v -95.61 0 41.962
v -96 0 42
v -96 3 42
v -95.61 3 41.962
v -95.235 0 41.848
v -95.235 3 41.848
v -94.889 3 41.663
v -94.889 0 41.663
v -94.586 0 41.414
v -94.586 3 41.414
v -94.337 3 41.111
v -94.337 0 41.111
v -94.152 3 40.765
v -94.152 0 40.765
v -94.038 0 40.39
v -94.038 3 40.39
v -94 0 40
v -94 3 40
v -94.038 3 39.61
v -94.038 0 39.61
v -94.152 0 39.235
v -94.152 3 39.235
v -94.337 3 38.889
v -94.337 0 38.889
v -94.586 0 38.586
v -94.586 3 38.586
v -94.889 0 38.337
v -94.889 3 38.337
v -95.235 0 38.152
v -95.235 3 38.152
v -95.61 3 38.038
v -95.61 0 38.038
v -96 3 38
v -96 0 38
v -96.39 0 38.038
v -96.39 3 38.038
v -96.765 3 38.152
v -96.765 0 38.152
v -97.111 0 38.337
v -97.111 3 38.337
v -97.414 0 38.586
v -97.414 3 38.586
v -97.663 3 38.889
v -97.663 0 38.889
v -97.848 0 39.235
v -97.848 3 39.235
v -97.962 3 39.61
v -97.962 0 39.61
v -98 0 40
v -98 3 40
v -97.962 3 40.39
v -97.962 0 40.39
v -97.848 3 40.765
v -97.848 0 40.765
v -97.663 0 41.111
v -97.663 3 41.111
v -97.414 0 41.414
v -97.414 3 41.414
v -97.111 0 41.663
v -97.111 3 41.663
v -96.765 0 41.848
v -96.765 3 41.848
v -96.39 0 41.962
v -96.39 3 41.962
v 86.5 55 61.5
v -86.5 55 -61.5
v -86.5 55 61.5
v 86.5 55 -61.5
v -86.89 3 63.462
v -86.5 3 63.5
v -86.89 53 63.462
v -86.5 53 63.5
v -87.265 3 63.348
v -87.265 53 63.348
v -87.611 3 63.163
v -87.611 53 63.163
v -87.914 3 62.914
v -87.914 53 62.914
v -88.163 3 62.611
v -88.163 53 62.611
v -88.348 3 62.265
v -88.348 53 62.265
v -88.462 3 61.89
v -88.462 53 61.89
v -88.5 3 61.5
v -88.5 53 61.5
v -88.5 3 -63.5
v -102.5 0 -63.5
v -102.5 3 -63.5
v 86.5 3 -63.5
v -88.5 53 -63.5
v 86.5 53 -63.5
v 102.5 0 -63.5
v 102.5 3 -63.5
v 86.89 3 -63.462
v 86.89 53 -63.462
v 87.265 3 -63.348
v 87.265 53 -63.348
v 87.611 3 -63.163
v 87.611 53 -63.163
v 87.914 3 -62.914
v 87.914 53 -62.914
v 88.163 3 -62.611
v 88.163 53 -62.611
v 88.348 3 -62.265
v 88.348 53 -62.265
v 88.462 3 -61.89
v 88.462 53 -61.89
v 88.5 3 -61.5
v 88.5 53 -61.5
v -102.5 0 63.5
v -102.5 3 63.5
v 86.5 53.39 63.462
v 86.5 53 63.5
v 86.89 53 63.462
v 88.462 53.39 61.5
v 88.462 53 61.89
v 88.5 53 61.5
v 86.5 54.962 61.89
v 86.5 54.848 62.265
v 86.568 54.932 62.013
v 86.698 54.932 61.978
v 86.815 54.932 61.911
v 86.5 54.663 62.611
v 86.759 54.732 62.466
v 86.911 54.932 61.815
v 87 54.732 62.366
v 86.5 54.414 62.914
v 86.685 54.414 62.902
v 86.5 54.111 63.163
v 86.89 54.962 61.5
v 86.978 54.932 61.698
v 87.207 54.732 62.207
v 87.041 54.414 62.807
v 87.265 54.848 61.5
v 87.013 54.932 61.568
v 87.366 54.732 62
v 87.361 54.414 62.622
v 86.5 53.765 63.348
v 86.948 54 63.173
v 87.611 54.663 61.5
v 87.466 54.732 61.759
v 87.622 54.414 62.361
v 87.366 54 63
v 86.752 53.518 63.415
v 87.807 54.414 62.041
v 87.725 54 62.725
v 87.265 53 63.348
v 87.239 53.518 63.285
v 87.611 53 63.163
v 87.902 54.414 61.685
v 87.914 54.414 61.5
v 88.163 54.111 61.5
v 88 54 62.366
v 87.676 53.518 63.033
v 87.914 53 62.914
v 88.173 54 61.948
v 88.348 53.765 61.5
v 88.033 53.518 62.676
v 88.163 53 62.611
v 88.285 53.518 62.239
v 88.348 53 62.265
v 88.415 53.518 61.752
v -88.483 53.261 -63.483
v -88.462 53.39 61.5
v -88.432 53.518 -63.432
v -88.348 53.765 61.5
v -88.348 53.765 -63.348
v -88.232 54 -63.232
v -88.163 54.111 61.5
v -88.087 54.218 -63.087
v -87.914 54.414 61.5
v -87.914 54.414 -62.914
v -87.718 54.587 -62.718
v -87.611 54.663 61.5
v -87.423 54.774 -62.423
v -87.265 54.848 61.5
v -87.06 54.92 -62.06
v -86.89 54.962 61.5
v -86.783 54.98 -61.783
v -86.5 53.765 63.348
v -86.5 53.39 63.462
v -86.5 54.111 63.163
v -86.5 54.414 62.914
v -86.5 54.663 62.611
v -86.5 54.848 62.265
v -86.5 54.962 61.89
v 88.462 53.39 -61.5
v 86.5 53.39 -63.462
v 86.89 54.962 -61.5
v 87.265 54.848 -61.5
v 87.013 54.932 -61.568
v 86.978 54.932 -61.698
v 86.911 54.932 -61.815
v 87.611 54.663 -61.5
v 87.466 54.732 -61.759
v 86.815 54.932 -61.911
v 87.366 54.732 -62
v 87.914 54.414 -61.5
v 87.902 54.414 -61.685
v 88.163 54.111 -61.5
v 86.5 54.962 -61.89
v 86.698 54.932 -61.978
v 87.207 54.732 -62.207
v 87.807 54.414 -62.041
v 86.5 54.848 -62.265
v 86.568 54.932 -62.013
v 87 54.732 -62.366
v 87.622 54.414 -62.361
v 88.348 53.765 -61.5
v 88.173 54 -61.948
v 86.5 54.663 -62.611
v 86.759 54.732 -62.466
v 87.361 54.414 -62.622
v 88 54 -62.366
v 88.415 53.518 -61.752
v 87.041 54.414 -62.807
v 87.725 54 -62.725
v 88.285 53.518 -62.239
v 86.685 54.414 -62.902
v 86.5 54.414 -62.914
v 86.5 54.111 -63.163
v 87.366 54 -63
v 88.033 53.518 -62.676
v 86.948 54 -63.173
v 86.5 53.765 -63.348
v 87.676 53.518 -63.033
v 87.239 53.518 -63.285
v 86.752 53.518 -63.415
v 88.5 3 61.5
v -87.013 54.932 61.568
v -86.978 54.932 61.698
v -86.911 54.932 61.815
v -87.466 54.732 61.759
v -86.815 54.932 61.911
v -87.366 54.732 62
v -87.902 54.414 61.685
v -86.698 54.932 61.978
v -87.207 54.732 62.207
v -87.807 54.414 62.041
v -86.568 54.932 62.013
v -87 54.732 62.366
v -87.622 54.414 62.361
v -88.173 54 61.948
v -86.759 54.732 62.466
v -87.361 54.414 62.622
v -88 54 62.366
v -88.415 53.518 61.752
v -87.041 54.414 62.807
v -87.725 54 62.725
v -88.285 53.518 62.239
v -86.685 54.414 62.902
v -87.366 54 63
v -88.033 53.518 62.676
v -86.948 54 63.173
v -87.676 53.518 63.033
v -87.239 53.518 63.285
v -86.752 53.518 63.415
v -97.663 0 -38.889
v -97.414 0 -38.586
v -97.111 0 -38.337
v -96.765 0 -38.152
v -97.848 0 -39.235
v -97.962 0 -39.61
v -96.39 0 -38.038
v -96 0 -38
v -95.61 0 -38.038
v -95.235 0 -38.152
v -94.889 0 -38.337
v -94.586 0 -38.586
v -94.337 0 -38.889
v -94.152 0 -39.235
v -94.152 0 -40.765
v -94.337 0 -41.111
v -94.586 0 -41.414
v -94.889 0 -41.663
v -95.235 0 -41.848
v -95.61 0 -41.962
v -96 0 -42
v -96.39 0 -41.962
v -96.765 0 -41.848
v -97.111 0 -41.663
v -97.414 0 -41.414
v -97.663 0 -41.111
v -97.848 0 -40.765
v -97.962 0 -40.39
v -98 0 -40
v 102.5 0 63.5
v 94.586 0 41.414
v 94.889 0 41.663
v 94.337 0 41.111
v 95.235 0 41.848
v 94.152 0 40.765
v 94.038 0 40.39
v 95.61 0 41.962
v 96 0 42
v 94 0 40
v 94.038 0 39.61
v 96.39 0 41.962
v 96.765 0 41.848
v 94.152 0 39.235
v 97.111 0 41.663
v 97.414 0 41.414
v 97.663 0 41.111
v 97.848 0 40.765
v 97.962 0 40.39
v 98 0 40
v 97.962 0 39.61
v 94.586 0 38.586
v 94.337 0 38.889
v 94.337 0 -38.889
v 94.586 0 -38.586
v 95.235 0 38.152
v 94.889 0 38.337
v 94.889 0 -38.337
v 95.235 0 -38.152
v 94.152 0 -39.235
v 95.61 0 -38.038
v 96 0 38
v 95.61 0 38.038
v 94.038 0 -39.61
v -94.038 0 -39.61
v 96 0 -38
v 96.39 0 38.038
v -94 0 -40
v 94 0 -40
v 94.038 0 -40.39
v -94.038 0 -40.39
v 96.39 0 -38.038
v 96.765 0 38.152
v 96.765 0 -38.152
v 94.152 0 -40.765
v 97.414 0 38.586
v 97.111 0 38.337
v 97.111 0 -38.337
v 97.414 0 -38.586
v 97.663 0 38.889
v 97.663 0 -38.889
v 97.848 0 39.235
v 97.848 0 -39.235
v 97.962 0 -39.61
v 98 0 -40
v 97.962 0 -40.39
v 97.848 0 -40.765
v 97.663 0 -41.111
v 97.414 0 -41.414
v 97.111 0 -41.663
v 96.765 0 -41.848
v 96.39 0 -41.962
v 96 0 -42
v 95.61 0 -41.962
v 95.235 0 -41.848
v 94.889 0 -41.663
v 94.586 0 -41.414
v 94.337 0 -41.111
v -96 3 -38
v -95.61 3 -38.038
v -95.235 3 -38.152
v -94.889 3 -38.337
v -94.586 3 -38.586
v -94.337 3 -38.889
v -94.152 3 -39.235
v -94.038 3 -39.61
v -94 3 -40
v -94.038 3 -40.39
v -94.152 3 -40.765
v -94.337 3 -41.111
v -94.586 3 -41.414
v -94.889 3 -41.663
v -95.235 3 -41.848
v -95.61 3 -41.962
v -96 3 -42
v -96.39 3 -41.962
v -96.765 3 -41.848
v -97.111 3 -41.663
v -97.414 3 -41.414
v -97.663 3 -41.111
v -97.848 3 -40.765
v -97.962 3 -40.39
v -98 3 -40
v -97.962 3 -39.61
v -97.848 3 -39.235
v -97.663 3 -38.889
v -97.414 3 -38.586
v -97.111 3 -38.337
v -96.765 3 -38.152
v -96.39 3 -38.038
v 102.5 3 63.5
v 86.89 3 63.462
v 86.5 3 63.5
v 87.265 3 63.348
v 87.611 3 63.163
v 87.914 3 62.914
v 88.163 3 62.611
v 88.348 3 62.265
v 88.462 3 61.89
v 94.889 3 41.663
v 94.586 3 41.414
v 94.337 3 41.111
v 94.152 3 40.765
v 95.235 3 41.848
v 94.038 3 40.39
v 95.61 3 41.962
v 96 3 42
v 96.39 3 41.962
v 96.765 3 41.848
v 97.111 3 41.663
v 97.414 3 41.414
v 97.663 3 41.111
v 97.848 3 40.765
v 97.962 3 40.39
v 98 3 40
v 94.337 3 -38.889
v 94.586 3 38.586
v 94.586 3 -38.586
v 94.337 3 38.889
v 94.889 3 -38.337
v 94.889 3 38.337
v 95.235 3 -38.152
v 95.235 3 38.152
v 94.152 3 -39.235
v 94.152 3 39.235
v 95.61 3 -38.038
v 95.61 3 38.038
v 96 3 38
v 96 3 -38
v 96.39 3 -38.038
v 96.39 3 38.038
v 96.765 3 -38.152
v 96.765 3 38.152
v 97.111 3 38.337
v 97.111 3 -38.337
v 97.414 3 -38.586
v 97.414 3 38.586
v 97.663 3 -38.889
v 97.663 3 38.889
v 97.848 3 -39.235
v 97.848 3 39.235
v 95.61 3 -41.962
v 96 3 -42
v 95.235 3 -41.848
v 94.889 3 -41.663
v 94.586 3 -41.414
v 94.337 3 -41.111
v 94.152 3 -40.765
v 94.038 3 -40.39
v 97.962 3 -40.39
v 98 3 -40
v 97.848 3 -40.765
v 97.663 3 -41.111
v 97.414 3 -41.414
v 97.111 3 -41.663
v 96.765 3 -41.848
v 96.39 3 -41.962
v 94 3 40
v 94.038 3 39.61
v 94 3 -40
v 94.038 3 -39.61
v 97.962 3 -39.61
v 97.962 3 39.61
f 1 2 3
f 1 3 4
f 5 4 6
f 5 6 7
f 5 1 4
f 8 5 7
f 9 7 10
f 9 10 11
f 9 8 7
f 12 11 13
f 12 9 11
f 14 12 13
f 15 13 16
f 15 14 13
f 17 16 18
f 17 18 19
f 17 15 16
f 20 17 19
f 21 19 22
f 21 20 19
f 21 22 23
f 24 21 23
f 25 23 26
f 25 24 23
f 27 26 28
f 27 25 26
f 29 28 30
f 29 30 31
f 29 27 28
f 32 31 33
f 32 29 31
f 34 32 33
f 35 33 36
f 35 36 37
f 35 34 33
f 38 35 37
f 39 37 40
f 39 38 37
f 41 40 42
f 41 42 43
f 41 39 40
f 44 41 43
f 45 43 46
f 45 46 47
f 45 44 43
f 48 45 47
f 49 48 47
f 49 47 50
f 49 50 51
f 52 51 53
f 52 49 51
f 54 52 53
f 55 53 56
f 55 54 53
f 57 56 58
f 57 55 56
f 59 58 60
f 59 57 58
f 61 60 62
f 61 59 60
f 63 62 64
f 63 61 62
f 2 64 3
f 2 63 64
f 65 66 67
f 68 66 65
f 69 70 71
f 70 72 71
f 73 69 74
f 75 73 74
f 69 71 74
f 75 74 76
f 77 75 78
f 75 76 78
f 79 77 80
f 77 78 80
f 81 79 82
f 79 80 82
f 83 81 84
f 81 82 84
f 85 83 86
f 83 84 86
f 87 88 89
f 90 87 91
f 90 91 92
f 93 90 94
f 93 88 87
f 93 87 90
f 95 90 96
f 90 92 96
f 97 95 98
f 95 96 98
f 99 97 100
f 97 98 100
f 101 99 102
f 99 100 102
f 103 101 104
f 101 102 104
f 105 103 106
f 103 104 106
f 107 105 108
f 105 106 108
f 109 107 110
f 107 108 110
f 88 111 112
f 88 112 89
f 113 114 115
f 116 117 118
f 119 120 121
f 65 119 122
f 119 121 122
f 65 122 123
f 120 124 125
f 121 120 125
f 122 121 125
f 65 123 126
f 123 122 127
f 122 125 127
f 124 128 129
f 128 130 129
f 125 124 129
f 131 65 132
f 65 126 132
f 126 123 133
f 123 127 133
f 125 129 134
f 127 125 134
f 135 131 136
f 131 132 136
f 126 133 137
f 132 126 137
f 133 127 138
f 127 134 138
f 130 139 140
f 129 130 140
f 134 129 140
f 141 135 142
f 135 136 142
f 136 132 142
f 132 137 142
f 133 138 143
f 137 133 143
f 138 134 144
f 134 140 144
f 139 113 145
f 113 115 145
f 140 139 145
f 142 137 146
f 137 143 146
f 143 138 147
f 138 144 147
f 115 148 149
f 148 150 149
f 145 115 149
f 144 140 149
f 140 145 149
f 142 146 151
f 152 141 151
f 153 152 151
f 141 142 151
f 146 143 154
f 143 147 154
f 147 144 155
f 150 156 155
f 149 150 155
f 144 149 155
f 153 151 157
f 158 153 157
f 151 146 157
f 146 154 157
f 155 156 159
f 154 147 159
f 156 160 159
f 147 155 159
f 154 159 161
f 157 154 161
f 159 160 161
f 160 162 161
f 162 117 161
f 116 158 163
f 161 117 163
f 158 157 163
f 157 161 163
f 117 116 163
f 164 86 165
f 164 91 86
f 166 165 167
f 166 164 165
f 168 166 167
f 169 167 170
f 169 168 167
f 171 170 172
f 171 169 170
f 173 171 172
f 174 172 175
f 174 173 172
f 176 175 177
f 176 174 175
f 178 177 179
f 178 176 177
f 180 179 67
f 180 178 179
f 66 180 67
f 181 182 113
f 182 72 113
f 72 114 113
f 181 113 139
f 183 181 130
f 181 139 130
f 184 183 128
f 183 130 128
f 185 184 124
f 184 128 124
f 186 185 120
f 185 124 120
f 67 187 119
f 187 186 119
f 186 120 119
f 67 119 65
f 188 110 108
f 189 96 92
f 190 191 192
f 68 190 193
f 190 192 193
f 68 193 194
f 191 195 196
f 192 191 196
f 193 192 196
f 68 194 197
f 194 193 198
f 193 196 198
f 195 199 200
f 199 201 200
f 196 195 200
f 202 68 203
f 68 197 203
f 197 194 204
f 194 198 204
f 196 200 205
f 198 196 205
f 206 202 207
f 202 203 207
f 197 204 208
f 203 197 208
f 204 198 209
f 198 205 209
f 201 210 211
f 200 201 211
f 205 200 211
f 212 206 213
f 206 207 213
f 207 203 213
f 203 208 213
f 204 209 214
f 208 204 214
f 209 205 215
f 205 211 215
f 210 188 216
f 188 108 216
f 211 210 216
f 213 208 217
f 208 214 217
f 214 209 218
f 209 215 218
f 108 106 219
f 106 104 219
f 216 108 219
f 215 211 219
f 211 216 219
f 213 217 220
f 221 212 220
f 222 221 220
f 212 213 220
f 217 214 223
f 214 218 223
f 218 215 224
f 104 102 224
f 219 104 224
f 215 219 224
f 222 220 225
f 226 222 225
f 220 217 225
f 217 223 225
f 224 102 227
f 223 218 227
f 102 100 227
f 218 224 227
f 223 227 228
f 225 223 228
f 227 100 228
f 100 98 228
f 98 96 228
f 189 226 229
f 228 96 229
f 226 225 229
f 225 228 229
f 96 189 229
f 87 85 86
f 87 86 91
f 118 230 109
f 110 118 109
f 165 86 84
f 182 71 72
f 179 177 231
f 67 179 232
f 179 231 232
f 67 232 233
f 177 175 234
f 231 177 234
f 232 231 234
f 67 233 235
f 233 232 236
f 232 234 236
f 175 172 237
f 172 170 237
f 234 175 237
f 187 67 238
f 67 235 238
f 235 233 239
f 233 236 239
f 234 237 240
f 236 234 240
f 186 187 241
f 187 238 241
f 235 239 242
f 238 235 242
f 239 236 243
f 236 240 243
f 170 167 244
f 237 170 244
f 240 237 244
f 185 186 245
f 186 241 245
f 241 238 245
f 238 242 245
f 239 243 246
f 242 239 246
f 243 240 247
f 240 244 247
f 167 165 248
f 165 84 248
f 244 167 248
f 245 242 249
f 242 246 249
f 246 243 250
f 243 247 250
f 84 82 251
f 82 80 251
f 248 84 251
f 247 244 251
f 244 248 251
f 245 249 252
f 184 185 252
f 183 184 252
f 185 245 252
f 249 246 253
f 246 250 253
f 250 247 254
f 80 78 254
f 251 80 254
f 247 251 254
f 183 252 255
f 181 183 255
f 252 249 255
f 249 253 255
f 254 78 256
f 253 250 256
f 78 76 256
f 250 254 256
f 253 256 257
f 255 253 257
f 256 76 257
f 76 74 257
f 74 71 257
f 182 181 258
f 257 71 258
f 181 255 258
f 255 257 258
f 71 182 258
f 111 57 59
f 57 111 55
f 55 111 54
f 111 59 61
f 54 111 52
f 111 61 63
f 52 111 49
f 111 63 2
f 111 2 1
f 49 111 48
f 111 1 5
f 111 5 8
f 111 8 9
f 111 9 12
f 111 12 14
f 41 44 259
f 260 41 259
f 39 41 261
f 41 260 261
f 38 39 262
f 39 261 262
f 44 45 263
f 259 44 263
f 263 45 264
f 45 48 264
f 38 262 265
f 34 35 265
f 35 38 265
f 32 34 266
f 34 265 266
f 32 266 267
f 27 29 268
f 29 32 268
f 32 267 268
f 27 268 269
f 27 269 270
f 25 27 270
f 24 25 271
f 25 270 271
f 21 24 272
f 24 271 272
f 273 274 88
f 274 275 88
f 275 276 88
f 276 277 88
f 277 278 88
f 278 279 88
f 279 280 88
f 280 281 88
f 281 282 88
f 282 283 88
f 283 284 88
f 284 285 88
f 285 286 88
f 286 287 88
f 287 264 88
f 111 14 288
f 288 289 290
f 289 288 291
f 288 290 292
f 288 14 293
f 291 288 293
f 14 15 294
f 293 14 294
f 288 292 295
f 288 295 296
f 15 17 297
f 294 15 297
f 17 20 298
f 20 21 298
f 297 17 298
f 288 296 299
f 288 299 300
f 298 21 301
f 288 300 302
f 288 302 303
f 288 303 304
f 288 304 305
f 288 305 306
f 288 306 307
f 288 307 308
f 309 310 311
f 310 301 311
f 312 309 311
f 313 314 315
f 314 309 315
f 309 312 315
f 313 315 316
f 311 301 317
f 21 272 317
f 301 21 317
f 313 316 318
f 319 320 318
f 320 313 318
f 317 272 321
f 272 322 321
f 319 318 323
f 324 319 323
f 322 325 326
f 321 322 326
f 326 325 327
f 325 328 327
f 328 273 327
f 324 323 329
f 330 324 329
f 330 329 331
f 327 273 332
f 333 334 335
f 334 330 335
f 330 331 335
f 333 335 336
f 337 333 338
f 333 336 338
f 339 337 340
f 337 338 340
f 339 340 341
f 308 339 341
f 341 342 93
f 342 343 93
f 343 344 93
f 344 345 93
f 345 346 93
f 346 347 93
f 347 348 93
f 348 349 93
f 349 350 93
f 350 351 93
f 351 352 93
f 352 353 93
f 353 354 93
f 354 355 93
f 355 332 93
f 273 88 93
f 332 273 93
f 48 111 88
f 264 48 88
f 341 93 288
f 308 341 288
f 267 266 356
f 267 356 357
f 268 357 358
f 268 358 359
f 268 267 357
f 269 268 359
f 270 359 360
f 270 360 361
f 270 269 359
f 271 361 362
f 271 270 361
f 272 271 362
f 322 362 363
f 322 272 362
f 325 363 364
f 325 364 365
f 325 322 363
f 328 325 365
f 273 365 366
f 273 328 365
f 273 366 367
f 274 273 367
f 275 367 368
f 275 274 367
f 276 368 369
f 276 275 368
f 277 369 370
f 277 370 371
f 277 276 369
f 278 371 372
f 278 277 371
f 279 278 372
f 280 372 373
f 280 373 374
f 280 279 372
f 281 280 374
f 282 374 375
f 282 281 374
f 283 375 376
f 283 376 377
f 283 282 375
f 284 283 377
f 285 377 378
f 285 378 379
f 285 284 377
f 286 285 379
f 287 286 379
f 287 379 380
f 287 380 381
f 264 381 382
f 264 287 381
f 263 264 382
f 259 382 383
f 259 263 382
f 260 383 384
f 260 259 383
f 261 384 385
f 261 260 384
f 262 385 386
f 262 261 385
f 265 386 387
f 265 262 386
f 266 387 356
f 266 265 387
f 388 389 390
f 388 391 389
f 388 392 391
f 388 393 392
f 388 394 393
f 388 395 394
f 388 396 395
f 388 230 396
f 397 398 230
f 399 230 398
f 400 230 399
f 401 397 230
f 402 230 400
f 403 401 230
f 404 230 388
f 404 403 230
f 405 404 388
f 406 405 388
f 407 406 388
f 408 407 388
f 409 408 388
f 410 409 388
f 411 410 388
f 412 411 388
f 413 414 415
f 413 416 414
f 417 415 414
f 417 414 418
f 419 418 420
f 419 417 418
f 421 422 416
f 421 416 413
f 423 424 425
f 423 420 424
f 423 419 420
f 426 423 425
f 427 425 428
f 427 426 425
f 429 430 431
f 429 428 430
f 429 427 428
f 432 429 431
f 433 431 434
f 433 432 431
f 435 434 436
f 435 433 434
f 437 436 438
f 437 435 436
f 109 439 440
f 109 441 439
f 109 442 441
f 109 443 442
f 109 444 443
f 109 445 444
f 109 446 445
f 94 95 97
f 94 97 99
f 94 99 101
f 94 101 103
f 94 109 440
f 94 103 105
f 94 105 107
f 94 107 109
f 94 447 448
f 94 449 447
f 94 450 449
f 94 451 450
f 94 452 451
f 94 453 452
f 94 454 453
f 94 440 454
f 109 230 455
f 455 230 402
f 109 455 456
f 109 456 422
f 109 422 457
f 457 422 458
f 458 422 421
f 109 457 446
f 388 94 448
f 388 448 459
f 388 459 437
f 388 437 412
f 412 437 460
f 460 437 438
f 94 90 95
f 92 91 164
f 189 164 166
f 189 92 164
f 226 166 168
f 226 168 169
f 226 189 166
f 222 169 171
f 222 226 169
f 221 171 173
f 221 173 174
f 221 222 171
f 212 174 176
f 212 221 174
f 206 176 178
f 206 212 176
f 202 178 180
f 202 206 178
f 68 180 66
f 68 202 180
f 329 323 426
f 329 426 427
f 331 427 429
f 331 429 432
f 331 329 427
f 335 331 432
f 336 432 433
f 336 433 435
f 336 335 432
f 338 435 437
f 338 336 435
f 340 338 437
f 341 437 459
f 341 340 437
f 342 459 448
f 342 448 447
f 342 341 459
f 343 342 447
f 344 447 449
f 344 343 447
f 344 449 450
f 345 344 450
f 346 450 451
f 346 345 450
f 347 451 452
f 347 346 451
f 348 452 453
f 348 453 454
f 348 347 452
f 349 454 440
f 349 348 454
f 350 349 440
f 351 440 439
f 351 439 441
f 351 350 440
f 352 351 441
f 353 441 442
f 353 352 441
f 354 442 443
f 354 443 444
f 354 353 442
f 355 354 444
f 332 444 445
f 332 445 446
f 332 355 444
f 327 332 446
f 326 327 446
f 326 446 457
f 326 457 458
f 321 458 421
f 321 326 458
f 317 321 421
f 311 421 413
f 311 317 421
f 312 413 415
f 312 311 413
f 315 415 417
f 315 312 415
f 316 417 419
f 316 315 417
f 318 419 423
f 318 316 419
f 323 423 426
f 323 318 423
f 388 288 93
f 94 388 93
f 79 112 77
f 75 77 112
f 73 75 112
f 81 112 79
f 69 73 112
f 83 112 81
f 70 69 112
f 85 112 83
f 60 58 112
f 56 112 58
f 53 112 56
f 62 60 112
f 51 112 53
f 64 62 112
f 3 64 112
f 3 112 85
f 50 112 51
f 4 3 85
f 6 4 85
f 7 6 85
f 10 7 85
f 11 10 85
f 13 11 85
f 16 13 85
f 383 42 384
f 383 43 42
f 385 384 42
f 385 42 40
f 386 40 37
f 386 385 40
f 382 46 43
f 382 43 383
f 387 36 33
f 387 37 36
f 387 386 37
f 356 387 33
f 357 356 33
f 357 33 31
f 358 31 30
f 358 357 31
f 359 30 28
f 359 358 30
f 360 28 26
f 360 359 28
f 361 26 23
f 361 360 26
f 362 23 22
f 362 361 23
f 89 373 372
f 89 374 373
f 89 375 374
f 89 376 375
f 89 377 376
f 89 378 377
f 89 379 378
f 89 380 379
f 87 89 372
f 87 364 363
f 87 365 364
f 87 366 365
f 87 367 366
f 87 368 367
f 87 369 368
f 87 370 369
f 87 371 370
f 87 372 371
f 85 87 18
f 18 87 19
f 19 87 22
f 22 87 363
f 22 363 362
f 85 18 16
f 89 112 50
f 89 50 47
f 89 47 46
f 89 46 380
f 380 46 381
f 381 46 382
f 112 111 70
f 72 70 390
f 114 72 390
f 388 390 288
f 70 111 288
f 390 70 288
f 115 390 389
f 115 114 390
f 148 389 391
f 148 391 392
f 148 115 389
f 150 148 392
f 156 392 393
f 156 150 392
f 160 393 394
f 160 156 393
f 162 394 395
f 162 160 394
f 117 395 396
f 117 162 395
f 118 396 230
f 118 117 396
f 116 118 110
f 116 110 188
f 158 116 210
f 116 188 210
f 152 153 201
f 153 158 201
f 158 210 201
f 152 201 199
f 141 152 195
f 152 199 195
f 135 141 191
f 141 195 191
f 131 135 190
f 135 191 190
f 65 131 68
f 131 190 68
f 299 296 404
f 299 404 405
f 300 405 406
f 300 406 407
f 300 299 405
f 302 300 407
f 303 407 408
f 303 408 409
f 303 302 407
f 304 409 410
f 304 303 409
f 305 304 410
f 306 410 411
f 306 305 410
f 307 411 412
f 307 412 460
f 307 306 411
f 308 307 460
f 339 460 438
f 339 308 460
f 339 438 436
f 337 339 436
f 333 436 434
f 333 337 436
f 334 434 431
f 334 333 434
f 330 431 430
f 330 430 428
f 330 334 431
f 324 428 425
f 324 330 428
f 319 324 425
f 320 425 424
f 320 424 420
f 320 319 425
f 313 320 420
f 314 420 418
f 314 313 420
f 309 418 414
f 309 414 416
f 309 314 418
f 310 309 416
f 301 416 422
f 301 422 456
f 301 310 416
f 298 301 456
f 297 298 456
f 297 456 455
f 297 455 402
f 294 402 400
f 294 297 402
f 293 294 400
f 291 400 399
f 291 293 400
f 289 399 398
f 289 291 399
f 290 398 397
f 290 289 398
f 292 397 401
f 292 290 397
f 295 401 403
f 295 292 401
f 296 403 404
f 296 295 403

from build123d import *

# Parameters (mm, degrees)
SKETCH_2_W      = 205
SKETCH_2_H      = 127
SKETCH_2_R      = 2
EXTRUDE_1_DEPTH = 3
SKETCH_3_W      = 177
SKETCH_3_H      = 127
EXTRUDE_2_DEPTH = 52
FILLET_1_R      = 2


with BuildPart() as part:
    # 草图2 → 凸台-拉伸1 (new body)
    with BuildSketch(Plane(origin=(0, 0, 0), x_dir=(1, 0, 0), z_dir=(0, 1, 0))):
        Rectangle(SKETCH_2_W, SKETCH_2_H)
        with Locations(Location((-96, 40, 0), (0, 0, 270))):
            Circle(SKETCH_2_R, mode=Mode.SUBTRACT)
        with Locations(Location((96, 40, 0), (0, 0, 270))):
            Circle(SKETCH_2_R, mode=Mode.SUBTRACT)
        with Locations(Location((96, -40, 0), (0, 0, 270))):
            Circle(SKETCH_2_R, mode=Mode.SUBTRACT)
        with Locations(Location((-96, -40, 0), (0, 0, 270))):
            Circle(SKETCH_2_R, mode=Mode.SUBTRACT)
    extrude(amount=EXTRUDE_1_DEPTH)

    # 草图3 → 凸台-拉伸2 (add)
    with BuildSketch(Plane(origin=(0, 3, 0), x_dir=(1, 0, 0), z_dir=(0, 1, 0))):
        Rectangle(SKETCH_3_W, SKETCH_3_H)
    extrude(amount=EXTRUDE_2_DEPTH)

    # 圆角1
    fillet_1_edges = [part.edges().sort_by_distance(p)[0] for p in [
        (-88.5, 29, 63.5),
        (88.5, 29, 63.5),
        (88.5, 29, -63.5),
        (-88.5, 55, 0),
        (0, 55, 63.5),
        (88.5, 55, 0),
        (0, 55, -63.5),
    ]]
    fillet(fillet_1_edges, radius=FILLET_1_R)


solid = part.part
